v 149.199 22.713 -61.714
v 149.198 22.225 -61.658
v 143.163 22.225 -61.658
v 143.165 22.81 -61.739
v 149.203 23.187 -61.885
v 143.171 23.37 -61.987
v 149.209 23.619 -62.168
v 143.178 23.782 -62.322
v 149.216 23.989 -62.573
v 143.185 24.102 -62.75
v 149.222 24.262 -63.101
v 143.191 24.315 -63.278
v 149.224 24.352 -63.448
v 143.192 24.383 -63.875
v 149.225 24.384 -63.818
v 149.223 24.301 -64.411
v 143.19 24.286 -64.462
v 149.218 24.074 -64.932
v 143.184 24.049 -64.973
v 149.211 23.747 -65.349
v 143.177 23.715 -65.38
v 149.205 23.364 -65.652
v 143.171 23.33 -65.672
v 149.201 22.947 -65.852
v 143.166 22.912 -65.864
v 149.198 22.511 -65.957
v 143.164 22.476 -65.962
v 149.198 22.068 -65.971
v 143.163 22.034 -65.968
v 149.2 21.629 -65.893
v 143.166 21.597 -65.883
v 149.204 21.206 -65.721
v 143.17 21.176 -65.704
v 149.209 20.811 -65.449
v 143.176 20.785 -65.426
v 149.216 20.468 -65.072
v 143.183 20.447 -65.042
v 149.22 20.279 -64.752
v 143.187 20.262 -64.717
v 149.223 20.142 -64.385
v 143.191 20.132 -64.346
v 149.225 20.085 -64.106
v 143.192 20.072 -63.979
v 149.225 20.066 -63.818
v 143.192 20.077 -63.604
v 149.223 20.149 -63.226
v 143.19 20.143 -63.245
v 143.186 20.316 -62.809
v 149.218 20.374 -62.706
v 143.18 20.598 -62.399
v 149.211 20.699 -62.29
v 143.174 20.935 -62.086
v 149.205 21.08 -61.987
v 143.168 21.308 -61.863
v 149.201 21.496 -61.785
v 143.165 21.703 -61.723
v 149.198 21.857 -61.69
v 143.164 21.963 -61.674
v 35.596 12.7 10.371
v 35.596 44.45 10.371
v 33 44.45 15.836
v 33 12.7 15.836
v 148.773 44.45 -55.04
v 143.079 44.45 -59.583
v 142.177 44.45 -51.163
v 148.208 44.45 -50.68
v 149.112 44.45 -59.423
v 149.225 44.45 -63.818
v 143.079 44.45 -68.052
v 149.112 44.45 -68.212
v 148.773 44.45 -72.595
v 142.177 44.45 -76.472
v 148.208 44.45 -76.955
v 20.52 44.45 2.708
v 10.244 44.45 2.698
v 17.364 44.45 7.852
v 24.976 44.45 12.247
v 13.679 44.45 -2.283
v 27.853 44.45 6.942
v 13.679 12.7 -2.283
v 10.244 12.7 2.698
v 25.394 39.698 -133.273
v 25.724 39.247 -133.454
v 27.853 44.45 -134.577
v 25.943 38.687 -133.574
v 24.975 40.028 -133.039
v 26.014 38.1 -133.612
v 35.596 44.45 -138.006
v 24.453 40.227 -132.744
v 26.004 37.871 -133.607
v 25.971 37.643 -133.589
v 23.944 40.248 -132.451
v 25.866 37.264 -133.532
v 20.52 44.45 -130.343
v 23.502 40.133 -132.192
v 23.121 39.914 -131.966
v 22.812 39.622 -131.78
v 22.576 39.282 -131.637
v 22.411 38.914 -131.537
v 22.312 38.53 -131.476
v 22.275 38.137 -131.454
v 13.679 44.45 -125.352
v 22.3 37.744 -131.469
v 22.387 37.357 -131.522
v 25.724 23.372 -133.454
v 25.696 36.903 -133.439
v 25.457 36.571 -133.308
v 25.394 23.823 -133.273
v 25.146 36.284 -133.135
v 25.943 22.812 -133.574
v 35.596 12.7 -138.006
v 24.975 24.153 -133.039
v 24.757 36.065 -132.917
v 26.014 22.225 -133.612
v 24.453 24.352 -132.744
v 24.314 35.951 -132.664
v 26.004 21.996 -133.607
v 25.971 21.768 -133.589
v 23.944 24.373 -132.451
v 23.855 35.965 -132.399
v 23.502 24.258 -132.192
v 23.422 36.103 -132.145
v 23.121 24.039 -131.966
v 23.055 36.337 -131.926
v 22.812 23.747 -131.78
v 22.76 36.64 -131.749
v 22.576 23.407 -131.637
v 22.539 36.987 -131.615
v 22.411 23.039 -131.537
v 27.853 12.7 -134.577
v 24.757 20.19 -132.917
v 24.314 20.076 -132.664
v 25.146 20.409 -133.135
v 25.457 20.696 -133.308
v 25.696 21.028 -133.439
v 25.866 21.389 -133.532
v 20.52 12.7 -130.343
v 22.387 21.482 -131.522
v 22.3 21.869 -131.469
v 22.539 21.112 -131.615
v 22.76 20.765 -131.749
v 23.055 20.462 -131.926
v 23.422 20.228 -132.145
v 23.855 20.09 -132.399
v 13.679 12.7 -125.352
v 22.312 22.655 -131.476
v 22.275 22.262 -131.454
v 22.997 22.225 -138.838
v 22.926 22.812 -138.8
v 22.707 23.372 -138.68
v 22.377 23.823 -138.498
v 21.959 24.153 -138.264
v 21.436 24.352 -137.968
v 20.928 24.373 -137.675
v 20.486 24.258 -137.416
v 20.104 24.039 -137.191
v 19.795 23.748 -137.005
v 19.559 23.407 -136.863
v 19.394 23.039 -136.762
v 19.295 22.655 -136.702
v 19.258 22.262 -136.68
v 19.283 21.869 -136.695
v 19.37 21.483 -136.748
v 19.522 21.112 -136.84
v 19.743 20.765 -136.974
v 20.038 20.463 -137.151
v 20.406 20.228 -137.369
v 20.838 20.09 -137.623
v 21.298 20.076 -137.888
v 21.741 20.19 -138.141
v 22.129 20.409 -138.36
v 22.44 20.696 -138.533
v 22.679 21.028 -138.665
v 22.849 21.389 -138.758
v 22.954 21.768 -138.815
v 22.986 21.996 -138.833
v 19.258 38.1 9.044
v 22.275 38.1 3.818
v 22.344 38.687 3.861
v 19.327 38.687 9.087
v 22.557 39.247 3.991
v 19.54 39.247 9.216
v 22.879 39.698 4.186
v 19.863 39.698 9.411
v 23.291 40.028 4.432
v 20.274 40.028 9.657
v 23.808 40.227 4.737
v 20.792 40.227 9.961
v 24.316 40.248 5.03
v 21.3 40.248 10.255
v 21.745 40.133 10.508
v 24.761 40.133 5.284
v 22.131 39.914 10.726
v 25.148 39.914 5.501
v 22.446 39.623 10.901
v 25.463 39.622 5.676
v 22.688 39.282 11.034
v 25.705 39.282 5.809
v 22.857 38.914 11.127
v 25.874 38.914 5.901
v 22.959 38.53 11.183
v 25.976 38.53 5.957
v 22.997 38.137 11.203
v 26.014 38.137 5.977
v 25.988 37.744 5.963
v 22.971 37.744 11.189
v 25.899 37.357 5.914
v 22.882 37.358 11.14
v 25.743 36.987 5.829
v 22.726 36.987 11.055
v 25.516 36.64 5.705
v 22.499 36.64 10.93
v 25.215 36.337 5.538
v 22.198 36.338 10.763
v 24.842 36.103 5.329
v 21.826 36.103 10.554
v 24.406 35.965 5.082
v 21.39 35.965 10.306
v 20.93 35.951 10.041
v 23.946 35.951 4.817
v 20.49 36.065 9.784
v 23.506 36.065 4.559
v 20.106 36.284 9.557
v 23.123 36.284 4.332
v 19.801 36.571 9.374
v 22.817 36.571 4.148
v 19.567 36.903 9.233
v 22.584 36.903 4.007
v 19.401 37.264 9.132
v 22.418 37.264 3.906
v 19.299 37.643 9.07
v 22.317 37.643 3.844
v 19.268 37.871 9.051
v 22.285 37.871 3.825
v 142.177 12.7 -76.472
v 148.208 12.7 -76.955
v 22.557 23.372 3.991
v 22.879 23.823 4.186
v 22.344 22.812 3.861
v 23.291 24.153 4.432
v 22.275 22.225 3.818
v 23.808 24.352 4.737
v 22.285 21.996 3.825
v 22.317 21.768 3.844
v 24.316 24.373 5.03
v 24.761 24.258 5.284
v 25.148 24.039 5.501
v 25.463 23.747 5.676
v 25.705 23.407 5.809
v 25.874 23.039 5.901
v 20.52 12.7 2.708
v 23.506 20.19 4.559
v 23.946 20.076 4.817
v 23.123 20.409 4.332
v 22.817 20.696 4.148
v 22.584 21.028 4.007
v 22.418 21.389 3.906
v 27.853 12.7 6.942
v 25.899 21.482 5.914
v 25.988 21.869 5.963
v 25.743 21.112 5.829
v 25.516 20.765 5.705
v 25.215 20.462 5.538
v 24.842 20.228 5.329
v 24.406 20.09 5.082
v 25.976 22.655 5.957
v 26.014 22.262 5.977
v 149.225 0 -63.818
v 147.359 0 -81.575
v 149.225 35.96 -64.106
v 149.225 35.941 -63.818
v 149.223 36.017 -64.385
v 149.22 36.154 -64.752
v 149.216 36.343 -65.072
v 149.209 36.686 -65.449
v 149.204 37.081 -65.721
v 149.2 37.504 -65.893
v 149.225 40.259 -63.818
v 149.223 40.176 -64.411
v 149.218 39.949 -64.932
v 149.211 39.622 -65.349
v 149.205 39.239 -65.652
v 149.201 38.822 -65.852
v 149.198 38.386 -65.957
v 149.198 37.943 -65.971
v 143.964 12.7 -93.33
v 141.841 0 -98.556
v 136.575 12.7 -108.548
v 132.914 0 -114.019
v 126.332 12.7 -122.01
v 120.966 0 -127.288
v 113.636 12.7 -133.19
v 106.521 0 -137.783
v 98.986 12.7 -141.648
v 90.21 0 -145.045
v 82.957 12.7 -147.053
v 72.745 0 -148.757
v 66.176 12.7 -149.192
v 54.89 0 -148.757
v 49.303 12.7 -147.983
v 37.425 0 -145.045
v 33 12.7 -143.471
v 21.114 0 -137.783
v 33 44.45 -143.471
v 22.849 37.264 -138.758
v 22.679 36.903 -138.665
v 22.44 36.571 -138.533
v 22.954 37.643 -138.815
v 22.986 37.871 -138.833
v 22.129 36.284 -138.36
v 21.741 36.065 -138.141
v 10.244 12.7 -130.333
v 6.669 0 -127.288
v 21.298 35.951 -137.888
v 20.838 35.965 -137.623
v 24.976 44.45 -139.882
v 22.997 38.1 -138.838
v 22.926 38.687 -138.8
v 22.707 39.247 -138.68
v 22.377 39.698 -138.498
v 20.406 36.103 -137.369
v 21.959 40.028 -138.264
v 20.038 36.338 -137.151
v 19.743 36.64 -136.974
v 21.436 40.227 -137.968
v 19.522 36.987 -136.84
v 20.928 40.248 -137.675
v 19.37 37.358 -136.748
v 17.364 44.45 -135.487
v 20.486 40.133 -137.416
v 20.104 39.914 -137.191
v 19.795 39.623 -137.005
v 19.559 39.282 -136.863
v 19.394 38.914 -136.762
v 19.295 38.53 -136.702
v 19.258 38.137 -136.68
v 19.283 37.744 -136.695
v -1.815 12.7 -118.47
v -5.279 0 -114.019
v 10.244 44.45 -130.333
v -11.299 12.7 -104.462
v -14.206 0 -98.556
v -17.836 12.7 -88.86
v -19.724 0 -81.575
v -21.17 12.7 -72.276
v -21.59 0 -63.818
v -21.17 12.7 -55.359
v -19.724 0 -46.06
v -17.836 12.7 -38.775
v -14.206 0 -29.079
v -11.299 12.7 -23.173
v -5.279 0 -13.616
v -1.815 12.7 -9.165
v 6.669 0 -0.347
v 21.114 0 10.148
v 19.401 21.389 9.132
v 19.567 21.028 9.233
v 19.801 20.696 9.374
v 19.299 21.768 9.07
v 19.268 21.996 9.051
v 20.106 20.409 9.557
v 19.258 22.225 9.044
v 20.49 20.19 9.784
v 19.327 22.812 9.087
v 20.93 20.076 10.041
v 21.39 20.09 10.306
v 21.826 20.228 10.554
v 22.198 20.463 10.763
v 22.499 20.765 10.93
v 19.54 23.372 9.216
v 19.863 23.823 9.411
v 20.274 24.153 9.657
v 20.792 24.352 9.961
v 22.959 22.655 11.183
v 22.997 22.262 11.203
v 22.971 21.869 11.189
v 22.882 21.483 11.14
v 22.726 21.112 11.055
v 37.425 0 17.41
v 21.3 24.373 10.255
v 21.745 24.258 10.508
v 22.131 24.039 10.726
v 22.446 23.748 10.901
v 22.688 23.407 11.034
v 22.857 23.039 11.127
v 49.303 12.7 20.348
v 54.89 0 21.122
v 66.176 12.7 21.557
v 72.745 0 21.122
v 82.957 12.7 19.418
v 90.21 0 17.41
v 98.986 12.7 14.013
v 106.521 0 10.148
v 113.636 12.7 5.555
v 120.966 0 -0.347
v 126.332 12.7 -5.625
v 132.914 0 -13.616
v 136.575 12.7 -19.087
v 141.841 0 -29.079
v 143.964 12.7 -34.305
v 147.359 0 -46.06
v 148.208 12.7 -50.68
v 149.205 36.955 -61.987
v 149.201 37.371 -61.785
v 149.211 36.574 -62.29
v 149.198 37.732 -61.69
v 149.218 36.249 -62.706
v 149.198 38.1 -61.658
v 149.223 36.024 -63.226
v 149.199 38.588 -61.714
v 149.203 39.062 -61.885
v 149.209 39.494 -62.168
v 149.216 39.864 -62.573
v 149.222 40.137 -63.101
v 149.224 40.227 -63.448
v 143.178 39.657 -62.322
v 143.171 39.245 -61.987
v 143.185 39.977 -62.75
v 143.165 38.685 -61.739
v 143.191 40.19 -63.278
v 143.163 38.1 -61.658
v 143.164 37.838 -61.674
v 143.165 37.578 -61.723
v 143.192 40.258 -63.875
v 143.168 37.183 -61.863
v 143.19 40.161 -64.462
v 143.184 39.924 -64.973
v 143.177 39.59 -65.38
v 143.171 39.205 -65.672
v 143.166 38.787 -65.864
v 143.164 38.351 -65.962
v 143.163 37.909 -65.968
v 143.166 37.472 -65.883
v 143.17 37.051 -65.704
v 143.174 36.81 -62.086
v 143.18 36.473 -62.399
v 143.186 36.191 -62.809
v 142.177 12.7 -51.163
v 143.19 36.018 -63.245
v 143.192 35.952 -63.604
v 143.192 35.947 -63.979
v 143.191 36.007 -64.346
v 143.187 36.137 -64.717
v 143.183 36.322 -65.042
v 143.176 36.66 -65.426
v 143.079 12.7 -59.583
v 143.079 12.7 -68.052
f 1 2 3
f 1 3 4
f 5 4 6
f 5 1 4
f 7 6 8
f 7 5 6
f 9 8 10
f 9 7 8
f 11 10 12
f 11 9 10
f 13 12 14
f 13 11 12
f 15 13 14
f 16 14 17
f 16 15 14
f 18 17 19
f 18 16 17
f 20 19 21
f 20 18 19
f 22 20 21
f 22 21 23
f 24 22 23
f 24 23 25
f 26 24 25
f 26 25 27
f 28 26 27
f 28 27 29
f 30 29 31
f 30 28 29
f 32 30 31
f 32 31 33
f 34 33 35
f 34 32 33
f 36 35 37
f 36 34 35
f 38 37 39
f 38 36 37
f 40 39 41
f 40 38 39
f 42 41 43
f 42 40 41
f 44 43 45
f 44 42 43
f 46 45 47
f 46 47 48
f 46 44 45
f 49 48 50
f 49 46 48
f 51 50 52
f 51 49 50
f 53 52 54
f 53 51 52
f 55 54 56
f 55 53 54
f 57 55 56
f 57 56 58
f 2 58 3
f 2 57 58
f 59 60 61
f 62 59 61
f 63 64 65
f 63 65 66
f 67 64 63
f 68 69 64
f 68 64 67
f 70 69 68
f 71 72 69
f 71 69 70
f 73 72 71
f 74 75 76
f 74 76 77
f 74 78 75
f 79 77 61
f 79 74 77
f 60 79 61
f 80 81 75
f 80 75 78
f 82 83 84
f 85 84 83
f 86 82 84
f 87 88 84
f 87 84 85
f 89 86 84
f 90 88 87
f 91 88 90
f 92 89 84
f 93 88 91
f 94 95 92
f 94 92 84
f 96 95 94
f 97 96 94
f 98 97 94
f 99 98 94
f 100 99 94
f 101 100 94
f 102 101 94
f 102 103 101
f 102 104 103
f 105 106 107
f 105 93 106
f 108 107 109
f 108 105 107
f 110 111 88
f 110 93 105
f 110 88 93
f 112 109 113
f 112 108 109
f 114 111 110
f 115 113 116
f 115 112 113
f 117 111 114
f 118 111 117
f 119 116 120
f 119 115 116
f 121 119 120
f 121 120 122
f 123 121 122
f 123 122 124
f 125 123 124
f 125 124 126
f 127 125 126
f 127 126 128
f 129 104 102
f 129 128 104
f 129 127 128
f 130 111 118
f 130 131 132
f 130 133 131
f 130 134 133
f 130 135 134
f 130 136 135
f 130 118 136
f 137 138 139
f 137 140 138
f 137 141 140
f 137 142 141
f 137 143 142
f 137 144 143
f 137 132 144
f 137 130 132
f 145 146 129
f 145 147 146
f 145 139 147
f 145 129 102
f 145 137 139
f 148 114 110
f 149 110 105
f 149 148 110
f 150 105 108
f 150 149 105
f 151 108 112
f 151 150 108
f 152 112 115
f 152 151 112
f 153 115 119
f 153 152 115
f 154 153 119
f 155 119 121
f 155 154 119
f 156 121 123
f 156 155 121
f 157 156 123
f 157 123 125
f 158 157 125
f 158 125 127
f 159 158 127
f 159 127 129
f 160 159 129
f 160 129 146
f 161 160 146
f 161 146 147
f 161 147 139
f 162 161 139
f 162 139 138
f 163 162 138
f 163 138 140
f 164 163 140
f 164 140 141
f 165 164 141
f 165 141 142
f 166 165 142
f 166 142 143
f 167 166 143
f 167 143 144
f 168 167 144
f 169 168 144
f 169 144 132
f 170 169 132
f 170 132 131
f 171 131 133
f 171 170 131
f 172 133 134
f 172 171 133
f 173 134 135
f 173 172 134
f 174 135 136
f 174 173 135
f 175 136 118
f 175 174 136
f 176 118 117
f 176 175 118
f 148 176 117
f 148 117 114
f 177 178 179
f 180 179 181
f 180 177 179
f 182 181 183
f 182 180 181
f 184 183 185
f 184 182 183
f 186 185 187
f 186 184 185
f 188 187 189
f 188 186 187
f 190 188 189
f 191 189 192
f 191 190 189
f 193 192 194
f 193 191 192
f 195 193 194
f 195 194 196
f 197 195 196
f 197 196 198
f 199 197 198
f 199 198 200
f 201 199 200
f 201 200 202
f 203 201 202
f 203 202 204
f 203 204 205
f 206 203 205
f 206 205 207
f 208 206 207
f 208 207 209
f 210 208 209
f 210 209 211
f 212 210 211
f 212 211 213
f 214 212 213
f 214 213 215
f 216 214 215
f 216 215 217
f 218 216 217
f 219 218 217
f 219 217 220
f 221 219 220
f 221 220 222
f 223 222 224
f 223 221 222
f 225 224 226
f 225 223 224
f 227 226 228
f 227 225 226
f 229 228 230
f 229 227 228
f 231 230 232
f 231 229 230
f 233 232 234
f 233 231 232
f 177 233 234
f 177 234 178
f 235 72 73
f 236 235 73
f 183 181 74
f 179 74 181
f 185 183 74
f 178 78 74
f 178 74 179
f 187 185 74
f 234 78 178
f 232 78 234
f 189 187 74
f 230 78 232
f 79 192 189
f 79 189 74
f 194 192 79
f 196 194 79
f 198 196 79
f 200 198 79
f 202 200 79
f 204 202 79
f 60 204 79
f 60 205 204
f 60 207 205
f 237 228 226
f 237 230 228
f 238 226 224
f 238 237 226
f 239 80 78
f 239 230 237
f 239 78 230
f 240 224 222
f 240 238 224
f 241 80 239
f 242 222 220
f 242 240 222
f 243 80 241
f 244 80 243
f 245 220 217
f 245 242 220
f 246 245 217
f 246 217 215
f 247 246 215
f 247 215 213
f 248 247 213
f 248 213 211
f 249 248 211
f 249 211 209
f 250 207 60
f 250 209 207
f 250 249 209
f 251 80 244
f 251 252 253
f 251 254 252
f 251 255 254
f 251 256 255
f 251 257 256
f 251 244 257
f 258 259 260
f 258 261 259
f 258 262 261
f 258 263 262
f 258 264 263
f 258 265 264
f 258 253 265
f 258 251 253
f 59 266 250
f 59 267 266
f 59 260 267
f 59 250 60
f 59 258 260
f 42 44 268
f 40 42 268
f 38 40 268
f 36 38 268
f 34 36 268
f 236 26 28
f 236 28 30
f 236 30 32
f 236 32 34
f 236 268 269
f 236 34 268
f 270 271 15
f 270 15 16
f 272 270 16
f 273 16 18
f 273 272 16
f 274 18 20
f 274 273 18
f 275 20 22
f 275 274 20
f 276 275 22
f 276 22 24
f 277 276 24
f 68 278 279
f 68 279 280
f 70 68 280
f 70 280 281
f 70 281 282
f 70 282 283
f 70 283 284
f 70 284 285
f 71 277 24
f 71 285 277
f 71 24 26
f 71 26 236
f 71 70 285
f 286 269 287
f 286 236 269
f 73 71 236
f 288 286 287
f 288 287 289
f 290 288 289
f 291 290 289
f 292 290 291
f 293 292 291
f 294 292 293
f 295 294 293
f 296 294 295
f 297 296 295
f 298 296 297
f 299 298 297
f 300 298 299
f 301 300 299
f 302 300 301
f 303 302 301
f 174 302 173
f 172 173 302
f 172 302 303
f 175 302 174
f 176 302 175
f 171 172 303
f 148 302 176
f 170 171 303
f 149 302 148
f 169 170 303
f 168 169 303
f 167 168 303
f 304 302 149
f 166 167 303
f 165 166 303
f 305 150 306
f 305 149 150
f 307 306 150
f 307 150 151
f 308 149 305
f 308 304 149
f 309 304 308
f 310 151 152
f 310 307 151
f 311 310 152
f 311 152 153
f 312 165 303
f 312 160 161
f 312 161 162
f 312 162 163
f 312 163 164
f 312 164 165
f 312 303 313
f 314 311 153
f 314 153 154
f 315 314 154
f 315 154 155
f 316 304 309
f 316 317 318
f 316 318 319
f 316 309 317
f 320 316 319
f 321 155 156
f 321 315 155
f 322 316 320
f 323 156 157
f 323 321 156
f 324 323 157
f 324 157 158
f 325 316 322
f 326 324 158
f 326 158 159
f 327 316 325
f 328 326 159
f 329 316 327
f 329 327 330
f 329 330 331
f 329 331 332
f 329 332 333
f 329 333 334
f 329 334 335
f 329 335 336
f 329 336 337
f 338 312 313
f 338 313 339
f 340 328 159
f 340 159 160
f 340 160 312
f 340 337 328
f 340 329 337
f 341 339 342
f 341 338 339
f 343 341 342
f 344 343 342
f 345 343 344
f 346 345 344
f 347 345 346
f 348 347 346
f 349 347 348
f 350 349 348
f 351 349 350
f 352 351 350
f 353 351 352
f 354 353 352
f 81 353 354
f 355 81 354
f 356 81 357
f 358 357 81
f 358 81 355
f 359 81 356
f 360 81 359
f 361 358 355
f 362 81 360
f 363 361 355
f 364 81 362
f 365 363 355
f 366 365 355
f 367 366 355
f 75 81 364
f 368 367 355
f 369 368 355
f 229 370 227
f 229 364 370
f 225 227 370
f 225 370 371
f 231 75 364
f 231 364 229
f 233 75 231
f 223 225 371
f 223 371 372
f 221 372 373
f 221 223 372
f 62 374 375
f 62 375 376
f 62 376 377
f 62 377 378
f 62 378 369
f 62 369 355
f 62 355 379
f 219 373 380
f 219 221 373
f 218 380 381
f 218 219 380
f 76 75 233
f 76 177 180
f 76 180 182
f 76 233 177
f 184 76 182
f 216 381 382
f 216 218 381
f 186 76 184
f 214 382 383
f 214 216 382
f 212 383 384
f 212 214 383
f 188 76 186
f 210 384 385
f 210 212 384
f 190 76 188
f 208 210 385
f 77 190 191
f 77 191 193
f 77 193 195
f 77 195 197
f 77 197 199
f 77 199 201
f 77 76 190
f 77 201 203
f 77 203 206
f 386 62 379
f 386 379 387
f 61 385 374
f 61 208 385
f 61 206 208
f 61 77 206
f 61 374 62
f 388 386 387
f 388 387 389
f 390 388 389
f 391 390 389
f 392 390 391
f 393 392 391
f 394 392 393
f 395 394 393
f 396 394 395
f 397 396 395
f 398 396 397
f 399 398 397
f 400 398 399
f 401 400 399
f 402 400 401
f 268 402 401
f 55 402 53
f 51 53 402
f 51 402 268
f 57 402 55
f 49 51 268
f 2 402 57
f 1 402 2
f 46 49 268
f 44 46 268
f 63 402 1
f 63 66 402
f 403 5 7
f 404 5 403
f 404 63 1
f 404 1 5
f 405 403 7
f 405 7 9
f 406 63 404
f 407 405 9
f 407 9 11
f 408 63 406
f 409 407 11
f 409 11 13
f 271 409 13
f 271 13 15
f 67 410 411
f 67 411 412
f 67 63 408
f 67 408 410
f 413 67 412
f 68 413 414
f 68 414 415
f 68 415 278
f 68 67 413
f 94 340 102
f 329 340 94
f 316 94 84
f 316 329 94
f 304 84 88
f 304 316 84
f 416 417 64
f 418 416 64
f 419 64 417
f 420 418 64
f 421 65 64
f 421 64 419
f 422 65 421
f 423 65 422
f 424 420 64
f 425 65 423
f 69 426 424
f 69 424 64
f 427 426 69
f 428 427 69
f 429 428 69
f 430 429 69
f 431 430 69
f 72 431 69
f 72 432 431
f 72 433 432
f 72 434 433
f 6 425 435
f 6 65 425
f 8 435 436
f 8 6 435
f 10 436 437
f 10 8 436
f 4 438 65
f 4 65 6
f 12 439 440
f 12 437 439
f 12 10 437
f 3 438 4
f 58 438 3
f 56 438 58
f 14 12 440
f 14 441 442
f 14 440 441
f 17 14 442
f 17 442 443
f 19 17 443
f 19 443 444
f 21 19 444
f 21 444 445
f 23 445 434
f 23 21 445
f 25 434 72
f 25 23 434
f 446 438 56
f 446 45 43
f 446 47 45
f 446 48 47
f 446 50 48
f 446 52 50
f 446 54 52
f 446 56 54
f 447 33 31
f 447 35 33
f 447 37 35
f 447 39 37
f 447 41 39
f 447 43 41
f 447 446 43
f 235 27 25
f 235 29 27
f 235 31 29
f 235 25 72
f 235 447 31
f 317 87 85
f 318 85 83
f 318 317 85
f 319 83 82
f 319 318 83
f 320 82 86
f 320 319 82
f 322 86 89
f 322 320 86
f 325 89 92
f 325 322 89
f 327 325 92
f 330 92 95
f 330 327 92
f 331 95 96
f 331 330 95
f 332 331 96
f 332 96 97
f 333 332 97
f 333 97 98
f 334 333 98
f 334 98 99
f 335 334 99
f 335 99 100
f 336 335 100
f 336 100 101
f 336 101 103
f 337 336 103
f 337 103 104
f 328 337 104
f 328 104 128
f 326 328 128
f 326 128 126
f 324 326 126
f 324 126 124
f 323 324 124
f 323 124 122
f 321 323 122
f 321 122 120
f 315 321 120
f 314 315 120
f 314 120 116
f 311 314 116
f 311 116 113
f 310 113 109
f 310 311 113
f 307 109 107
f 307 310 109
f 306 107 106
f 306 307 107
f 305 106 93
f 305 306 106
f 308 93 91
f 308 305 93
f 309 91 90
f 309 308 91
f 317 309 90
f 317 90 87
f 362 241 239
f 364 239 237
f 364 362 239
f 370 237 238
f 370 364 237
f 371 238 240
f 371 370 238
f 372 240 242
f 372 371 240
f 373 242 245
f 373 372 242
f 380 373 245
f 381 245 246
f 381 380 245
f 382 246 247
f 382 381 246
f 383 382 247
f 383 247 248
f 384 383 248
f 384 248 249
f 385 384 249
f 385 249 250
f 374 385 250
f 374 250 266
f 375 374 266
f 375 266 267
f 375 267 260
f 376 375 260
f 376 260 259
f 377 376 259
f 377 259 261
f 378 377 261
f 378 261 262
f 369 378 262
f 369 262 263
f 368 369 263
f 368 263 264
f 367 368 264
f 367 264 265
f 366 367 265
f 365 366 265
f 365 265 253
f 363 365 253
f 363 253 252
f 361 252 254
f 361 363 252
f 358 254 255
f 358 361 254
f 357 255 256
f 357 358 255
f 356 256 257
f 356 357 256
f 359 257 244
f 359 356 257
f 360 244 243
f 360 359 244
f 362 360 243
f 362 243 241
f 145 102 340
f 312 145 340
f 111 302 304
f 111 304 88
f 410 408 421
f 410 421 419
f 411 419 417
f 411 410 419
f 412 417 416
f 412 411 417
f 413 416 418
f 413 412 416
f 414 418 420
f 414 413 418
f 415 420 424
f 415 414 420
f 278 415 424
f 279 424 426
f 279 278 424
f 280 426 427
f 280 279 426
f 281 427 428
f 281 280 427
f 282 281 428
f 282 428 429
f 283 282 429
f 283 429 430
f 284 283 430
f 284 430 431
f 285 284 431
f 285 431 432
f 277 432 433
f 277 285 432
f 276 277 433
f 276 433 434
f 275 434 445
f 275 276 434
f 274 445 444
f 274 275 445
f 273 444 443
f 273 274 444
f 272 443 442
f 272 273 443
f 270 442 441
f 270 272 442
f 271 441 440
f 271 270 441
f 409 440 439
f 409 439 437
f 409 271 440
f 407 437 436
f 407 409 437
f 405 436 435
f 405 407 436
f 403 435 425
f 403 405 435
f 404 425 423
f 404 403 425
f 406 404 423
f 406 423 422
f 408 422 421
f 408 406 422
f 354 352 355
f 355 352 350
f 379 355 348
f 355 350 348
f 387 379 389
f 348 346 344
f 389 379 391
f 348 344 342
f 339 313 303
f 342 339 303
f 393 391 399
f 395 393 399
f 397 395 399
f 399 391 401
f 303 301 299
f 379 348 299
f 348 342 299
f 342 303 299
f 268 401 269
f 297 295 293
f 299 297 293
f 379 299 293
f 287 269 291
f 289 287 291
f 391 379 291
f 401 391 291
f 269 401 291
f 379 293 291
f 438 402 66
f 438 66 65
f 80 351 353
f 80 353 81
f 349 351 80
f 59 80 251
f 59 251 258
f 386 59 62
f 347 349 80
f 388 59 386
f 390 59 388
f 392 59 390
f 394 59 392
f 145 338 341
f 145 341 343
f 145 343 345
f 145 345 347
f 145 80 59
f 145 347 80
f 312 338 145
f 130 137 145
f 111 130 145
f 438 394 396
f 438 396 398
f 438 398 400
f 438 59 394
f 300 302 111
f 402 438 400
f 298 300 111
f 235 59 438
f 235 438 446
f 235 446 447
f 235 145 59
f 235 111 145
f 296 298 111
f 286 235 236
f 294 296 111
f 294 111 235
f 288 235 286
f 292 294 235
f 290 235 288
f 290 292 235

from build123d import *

# Parameters (mm, degrees)
SKETCH1_W           = 127.635
SKETCH1_H           = 127.635
MAIN_PLATE_DEPTH    = 12.7
SKETCH9_R           = 85.725
BOSS_EXTRUDE1_DEPTH = 12.7
SKETCH10_R          = 95.25
SKETCH10_R_2        = 85.4075
CUT_EXTRUDE1_DEPTH  = 167.64
SKETCH18_R          = 85.4075
SKETCH18_R_2        = 79.375
BOSS_EXTRUDE2_DEPTH = 38.1
SKETCH15_R          = 2.159
CUT_EXTRUDE3_DEPTH  = 88.9
CIRPATTERN1_COUNT   = 3
SKETCH23_R          = 79.375
CUT_EXTRUDE6_DEPTH  = 111.600000066


with BuildPart() as part:
    # Sketch1 → Main Plate (new body)
    with BuildSketch(Plane(origin=(0, 0, 0), x_dir=(1, 0, 0), z_dir=(0, 1, 0))):
        with Locations((63.8175, 63.8175)):
            Rectangle(SKETCH1_W, SKETCH1_H)
    extrude(amount=MAIN_PLATE_DEPTH)

    # Sketch9 → Boss-Extrude1 (add)
    with BuildSketch(Plane(origin=(0, 12.7, 0), x_dir=(1, 0, 0), z_dir=(0, 1, 0))):
        with Locations((63.8175, 63.8175)):
            Circle(SKETCH9_R)
    extrude(amount=-BOSS_EXTRUDE1_DEPTH)

    # Sketch10 → Cut-Extrude1 (cut)
    with BuildSketch(Plane(origin=(0, 12.7, 0), x_dir=(1, 0, 0), z_dir=(0, 1, 0))):
        with Locations((63.8175, 63.8175)):
            Circle(SKETCH10_R)
        with Locations((63.8175, 63.8175)):
            Circle(SKETCH10_R_2, mode=Mode.SUBTRACT)
    extrude(amount=-CUT_EXTRUDE1_DEPTH, mode=Mode.SUBTRACT)

    # Sketch18 → Boss-Extrude2 (add)
    with BuildSketch(Plane(origin=(0, 6.35, 0), x_dir=(1, 0, 0), z_dir=(0, 1, 0))):
        with Locations((63.8175, 63.8175)):
            Circle(SKETCH18_R)
        with Locations((63.8175, 63.8175)):
            Circle(SKETCH18_R_2, mode=Mode.SUBTRACT)
    extrude(amount=BOSS_EXTRUDE2_DEPTH)

    # Sketch15 → Cut-Extrude3 (cut)
    with BuildSketch(Plane(origin=(166.221610148, 0, 178.614251028), x_dir=(-0.866025404, 0, -0.5), z_dir=(0.5, 0, -0.866025404))):
        with Locations((209.900436354, 22.225)):
            Circle(SKETCH15_R)
        with Locations((209.900436354, 38.1)):
            Circle(SKETCH15_R)
    cut_extrude3 = extrude(amount=CUT_EXTRUDE3_DEPTH, mode=Mode.SUBTRACT)

    # CirPattern1: Cut-Extrude3 ×3 about axis
    cirpattern1_axis = Axis((63.8175, -154.94, -63.8175), (0, 1, 0))
    for i in range(1, CIRPATTERN1_COUNT):
        add(cut_extrude3.rotate(cirpattern1_axis, i * 360 / CIRPATTERN1_COUNT), mode=Mode.SUBTRACT)

    # Sketch23 → Cut-Extrude6 (cut)
    with BuildSketch(Plane(origin=(0, 12.7, 0), x_dir=(1, 0, 0), z_dir=(0, 1, 0))):
        with Locations((63.8175, 63.8175)):
            Circle(SKETCH23_R)
        with BuildLine():
            Line((13.678739997, 125.352005526), (7.552270878, 134.237860218))
            Line((7.552270878, 134.237860218), (-19.267108419, 125.320629884))
            Line((-19.267108419, 125.320629884), (-48.79695837, 60.397770071))
            Line((-48.79695837, 60.397770071), (-9.884344094, 7.052469015))
            Line((-9.884344094, 7.052469015), (6.959175986, -7.46308736))
            Line((6.959175986, -7.46308736), (13.678739997, 2.282994474))
            ThreePointArc((13.678739997, 2.282994474), (-15.5575, 63.8175), (13.678739997, 125.352005526))
        make_face()
        with BuildLine():
            Line((142.177324996, 76.471687114), (152.935935453, 77.334437661))
            Line((152.935935453, 77.334437661), (158.623077101, 105.019316613))
            Line((158.623077101, 105.019316613), (117.163156193, 163.054346747))
            Line((117.163156193, 163.054346747), (51.508463168, 156.027684783))
            Line((51.508463168, 156.027684783), (30.515862556, 148.698546693))
            Line((30.515862556, 148.698546693), (35.596435007, 138.00619264))
            ThreePointArc((35.596435007, 138.00619264), (103.505, 132.558266425), (142.177324996, 76.471687114))
        make_face()
        with BuildLine():
            Line((35.596435007, -10.37119264), (30.964293669, -20.119797879))
            Line((30.964293669, -20.119797879), (52.096531318, -38.887446496))
            Line((52.096531318, -38.887446496), (123.086302178, -31.999616818))
            Line((123.086302178, -31.999616818), (149.828380926, 28.372346201))
            Line((149.828380926, 28.372346201), (153.977461458, 50.217040667))
            Line((153.977461458, 50.217040667), (142.177324996, 51.163312886))
            ThreePointArc((142.177324996, 51.163312886), (103.505, -4.923266425), (35.596435007, -10.37119264))
        make_face()
    extrude(amount=CUT_EXTRUDE6_DEPTH, mode=Mode.SUBTRACT)


solid = part.part
